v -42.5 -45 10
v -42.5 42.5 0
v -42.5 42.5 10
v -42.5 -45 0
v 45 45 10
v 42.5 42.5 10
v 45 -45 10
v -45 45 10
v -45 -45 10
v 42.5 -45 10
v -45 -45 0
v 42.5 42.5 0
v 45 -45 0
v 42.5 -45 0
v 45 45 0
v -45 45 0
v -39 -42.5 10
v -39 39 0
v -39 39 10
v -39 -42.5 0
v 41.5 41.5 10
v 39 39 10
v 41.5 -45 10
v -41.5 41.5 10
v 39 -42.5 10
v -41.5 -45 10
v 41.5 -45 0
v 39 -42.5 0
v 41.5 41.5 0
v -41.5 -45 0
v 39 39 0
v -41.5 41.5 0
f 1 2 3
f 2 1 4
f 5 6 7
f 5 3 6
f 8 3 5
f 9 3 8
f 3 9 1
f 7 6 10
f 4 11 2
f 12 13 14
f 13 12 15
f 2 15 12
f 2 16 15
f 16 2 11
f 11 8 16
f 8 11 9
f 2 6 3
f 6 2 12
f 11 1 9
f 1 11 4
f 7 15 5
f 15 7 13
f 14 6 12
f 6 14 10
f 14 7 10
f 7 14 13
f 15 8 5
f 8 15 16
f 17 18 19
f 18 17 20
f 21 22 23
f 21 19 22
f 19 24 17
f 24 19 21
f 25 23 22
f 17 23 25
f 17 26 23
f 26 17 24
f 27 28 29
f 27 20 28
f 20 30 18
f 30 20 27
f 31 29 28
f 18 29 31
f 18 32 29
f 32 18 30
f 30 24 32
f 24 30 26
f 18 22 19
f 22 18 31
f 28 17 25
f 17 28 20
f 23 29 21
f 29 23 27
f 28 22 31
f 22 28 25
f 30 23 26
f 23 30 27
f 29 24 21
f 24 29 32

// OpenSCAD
$fn=64;
translate(v = [-45.000, -45.000])
union(){cube(size = [2.500, 87.500, 10]);
translate(v = [87.500, 0])
cube(size = [2.500, 87.500, 10]);
translate(v = [0, 87.500])
cube(size = [90, 2.500, 10]);
translate(v = [3.500, 2.500])
cube(size = [2.500, 81.500, 10]);
translate(v = [84.000, 2.500])
cube(size = [2.500, 81.500, 10]);
translate(v = [3.500, 0])
cube(size = [83.000, 2.500, 10]);
translate(v = [3.500, 84.000])
cube(size = [83.000, 2.500, 10]);
}
